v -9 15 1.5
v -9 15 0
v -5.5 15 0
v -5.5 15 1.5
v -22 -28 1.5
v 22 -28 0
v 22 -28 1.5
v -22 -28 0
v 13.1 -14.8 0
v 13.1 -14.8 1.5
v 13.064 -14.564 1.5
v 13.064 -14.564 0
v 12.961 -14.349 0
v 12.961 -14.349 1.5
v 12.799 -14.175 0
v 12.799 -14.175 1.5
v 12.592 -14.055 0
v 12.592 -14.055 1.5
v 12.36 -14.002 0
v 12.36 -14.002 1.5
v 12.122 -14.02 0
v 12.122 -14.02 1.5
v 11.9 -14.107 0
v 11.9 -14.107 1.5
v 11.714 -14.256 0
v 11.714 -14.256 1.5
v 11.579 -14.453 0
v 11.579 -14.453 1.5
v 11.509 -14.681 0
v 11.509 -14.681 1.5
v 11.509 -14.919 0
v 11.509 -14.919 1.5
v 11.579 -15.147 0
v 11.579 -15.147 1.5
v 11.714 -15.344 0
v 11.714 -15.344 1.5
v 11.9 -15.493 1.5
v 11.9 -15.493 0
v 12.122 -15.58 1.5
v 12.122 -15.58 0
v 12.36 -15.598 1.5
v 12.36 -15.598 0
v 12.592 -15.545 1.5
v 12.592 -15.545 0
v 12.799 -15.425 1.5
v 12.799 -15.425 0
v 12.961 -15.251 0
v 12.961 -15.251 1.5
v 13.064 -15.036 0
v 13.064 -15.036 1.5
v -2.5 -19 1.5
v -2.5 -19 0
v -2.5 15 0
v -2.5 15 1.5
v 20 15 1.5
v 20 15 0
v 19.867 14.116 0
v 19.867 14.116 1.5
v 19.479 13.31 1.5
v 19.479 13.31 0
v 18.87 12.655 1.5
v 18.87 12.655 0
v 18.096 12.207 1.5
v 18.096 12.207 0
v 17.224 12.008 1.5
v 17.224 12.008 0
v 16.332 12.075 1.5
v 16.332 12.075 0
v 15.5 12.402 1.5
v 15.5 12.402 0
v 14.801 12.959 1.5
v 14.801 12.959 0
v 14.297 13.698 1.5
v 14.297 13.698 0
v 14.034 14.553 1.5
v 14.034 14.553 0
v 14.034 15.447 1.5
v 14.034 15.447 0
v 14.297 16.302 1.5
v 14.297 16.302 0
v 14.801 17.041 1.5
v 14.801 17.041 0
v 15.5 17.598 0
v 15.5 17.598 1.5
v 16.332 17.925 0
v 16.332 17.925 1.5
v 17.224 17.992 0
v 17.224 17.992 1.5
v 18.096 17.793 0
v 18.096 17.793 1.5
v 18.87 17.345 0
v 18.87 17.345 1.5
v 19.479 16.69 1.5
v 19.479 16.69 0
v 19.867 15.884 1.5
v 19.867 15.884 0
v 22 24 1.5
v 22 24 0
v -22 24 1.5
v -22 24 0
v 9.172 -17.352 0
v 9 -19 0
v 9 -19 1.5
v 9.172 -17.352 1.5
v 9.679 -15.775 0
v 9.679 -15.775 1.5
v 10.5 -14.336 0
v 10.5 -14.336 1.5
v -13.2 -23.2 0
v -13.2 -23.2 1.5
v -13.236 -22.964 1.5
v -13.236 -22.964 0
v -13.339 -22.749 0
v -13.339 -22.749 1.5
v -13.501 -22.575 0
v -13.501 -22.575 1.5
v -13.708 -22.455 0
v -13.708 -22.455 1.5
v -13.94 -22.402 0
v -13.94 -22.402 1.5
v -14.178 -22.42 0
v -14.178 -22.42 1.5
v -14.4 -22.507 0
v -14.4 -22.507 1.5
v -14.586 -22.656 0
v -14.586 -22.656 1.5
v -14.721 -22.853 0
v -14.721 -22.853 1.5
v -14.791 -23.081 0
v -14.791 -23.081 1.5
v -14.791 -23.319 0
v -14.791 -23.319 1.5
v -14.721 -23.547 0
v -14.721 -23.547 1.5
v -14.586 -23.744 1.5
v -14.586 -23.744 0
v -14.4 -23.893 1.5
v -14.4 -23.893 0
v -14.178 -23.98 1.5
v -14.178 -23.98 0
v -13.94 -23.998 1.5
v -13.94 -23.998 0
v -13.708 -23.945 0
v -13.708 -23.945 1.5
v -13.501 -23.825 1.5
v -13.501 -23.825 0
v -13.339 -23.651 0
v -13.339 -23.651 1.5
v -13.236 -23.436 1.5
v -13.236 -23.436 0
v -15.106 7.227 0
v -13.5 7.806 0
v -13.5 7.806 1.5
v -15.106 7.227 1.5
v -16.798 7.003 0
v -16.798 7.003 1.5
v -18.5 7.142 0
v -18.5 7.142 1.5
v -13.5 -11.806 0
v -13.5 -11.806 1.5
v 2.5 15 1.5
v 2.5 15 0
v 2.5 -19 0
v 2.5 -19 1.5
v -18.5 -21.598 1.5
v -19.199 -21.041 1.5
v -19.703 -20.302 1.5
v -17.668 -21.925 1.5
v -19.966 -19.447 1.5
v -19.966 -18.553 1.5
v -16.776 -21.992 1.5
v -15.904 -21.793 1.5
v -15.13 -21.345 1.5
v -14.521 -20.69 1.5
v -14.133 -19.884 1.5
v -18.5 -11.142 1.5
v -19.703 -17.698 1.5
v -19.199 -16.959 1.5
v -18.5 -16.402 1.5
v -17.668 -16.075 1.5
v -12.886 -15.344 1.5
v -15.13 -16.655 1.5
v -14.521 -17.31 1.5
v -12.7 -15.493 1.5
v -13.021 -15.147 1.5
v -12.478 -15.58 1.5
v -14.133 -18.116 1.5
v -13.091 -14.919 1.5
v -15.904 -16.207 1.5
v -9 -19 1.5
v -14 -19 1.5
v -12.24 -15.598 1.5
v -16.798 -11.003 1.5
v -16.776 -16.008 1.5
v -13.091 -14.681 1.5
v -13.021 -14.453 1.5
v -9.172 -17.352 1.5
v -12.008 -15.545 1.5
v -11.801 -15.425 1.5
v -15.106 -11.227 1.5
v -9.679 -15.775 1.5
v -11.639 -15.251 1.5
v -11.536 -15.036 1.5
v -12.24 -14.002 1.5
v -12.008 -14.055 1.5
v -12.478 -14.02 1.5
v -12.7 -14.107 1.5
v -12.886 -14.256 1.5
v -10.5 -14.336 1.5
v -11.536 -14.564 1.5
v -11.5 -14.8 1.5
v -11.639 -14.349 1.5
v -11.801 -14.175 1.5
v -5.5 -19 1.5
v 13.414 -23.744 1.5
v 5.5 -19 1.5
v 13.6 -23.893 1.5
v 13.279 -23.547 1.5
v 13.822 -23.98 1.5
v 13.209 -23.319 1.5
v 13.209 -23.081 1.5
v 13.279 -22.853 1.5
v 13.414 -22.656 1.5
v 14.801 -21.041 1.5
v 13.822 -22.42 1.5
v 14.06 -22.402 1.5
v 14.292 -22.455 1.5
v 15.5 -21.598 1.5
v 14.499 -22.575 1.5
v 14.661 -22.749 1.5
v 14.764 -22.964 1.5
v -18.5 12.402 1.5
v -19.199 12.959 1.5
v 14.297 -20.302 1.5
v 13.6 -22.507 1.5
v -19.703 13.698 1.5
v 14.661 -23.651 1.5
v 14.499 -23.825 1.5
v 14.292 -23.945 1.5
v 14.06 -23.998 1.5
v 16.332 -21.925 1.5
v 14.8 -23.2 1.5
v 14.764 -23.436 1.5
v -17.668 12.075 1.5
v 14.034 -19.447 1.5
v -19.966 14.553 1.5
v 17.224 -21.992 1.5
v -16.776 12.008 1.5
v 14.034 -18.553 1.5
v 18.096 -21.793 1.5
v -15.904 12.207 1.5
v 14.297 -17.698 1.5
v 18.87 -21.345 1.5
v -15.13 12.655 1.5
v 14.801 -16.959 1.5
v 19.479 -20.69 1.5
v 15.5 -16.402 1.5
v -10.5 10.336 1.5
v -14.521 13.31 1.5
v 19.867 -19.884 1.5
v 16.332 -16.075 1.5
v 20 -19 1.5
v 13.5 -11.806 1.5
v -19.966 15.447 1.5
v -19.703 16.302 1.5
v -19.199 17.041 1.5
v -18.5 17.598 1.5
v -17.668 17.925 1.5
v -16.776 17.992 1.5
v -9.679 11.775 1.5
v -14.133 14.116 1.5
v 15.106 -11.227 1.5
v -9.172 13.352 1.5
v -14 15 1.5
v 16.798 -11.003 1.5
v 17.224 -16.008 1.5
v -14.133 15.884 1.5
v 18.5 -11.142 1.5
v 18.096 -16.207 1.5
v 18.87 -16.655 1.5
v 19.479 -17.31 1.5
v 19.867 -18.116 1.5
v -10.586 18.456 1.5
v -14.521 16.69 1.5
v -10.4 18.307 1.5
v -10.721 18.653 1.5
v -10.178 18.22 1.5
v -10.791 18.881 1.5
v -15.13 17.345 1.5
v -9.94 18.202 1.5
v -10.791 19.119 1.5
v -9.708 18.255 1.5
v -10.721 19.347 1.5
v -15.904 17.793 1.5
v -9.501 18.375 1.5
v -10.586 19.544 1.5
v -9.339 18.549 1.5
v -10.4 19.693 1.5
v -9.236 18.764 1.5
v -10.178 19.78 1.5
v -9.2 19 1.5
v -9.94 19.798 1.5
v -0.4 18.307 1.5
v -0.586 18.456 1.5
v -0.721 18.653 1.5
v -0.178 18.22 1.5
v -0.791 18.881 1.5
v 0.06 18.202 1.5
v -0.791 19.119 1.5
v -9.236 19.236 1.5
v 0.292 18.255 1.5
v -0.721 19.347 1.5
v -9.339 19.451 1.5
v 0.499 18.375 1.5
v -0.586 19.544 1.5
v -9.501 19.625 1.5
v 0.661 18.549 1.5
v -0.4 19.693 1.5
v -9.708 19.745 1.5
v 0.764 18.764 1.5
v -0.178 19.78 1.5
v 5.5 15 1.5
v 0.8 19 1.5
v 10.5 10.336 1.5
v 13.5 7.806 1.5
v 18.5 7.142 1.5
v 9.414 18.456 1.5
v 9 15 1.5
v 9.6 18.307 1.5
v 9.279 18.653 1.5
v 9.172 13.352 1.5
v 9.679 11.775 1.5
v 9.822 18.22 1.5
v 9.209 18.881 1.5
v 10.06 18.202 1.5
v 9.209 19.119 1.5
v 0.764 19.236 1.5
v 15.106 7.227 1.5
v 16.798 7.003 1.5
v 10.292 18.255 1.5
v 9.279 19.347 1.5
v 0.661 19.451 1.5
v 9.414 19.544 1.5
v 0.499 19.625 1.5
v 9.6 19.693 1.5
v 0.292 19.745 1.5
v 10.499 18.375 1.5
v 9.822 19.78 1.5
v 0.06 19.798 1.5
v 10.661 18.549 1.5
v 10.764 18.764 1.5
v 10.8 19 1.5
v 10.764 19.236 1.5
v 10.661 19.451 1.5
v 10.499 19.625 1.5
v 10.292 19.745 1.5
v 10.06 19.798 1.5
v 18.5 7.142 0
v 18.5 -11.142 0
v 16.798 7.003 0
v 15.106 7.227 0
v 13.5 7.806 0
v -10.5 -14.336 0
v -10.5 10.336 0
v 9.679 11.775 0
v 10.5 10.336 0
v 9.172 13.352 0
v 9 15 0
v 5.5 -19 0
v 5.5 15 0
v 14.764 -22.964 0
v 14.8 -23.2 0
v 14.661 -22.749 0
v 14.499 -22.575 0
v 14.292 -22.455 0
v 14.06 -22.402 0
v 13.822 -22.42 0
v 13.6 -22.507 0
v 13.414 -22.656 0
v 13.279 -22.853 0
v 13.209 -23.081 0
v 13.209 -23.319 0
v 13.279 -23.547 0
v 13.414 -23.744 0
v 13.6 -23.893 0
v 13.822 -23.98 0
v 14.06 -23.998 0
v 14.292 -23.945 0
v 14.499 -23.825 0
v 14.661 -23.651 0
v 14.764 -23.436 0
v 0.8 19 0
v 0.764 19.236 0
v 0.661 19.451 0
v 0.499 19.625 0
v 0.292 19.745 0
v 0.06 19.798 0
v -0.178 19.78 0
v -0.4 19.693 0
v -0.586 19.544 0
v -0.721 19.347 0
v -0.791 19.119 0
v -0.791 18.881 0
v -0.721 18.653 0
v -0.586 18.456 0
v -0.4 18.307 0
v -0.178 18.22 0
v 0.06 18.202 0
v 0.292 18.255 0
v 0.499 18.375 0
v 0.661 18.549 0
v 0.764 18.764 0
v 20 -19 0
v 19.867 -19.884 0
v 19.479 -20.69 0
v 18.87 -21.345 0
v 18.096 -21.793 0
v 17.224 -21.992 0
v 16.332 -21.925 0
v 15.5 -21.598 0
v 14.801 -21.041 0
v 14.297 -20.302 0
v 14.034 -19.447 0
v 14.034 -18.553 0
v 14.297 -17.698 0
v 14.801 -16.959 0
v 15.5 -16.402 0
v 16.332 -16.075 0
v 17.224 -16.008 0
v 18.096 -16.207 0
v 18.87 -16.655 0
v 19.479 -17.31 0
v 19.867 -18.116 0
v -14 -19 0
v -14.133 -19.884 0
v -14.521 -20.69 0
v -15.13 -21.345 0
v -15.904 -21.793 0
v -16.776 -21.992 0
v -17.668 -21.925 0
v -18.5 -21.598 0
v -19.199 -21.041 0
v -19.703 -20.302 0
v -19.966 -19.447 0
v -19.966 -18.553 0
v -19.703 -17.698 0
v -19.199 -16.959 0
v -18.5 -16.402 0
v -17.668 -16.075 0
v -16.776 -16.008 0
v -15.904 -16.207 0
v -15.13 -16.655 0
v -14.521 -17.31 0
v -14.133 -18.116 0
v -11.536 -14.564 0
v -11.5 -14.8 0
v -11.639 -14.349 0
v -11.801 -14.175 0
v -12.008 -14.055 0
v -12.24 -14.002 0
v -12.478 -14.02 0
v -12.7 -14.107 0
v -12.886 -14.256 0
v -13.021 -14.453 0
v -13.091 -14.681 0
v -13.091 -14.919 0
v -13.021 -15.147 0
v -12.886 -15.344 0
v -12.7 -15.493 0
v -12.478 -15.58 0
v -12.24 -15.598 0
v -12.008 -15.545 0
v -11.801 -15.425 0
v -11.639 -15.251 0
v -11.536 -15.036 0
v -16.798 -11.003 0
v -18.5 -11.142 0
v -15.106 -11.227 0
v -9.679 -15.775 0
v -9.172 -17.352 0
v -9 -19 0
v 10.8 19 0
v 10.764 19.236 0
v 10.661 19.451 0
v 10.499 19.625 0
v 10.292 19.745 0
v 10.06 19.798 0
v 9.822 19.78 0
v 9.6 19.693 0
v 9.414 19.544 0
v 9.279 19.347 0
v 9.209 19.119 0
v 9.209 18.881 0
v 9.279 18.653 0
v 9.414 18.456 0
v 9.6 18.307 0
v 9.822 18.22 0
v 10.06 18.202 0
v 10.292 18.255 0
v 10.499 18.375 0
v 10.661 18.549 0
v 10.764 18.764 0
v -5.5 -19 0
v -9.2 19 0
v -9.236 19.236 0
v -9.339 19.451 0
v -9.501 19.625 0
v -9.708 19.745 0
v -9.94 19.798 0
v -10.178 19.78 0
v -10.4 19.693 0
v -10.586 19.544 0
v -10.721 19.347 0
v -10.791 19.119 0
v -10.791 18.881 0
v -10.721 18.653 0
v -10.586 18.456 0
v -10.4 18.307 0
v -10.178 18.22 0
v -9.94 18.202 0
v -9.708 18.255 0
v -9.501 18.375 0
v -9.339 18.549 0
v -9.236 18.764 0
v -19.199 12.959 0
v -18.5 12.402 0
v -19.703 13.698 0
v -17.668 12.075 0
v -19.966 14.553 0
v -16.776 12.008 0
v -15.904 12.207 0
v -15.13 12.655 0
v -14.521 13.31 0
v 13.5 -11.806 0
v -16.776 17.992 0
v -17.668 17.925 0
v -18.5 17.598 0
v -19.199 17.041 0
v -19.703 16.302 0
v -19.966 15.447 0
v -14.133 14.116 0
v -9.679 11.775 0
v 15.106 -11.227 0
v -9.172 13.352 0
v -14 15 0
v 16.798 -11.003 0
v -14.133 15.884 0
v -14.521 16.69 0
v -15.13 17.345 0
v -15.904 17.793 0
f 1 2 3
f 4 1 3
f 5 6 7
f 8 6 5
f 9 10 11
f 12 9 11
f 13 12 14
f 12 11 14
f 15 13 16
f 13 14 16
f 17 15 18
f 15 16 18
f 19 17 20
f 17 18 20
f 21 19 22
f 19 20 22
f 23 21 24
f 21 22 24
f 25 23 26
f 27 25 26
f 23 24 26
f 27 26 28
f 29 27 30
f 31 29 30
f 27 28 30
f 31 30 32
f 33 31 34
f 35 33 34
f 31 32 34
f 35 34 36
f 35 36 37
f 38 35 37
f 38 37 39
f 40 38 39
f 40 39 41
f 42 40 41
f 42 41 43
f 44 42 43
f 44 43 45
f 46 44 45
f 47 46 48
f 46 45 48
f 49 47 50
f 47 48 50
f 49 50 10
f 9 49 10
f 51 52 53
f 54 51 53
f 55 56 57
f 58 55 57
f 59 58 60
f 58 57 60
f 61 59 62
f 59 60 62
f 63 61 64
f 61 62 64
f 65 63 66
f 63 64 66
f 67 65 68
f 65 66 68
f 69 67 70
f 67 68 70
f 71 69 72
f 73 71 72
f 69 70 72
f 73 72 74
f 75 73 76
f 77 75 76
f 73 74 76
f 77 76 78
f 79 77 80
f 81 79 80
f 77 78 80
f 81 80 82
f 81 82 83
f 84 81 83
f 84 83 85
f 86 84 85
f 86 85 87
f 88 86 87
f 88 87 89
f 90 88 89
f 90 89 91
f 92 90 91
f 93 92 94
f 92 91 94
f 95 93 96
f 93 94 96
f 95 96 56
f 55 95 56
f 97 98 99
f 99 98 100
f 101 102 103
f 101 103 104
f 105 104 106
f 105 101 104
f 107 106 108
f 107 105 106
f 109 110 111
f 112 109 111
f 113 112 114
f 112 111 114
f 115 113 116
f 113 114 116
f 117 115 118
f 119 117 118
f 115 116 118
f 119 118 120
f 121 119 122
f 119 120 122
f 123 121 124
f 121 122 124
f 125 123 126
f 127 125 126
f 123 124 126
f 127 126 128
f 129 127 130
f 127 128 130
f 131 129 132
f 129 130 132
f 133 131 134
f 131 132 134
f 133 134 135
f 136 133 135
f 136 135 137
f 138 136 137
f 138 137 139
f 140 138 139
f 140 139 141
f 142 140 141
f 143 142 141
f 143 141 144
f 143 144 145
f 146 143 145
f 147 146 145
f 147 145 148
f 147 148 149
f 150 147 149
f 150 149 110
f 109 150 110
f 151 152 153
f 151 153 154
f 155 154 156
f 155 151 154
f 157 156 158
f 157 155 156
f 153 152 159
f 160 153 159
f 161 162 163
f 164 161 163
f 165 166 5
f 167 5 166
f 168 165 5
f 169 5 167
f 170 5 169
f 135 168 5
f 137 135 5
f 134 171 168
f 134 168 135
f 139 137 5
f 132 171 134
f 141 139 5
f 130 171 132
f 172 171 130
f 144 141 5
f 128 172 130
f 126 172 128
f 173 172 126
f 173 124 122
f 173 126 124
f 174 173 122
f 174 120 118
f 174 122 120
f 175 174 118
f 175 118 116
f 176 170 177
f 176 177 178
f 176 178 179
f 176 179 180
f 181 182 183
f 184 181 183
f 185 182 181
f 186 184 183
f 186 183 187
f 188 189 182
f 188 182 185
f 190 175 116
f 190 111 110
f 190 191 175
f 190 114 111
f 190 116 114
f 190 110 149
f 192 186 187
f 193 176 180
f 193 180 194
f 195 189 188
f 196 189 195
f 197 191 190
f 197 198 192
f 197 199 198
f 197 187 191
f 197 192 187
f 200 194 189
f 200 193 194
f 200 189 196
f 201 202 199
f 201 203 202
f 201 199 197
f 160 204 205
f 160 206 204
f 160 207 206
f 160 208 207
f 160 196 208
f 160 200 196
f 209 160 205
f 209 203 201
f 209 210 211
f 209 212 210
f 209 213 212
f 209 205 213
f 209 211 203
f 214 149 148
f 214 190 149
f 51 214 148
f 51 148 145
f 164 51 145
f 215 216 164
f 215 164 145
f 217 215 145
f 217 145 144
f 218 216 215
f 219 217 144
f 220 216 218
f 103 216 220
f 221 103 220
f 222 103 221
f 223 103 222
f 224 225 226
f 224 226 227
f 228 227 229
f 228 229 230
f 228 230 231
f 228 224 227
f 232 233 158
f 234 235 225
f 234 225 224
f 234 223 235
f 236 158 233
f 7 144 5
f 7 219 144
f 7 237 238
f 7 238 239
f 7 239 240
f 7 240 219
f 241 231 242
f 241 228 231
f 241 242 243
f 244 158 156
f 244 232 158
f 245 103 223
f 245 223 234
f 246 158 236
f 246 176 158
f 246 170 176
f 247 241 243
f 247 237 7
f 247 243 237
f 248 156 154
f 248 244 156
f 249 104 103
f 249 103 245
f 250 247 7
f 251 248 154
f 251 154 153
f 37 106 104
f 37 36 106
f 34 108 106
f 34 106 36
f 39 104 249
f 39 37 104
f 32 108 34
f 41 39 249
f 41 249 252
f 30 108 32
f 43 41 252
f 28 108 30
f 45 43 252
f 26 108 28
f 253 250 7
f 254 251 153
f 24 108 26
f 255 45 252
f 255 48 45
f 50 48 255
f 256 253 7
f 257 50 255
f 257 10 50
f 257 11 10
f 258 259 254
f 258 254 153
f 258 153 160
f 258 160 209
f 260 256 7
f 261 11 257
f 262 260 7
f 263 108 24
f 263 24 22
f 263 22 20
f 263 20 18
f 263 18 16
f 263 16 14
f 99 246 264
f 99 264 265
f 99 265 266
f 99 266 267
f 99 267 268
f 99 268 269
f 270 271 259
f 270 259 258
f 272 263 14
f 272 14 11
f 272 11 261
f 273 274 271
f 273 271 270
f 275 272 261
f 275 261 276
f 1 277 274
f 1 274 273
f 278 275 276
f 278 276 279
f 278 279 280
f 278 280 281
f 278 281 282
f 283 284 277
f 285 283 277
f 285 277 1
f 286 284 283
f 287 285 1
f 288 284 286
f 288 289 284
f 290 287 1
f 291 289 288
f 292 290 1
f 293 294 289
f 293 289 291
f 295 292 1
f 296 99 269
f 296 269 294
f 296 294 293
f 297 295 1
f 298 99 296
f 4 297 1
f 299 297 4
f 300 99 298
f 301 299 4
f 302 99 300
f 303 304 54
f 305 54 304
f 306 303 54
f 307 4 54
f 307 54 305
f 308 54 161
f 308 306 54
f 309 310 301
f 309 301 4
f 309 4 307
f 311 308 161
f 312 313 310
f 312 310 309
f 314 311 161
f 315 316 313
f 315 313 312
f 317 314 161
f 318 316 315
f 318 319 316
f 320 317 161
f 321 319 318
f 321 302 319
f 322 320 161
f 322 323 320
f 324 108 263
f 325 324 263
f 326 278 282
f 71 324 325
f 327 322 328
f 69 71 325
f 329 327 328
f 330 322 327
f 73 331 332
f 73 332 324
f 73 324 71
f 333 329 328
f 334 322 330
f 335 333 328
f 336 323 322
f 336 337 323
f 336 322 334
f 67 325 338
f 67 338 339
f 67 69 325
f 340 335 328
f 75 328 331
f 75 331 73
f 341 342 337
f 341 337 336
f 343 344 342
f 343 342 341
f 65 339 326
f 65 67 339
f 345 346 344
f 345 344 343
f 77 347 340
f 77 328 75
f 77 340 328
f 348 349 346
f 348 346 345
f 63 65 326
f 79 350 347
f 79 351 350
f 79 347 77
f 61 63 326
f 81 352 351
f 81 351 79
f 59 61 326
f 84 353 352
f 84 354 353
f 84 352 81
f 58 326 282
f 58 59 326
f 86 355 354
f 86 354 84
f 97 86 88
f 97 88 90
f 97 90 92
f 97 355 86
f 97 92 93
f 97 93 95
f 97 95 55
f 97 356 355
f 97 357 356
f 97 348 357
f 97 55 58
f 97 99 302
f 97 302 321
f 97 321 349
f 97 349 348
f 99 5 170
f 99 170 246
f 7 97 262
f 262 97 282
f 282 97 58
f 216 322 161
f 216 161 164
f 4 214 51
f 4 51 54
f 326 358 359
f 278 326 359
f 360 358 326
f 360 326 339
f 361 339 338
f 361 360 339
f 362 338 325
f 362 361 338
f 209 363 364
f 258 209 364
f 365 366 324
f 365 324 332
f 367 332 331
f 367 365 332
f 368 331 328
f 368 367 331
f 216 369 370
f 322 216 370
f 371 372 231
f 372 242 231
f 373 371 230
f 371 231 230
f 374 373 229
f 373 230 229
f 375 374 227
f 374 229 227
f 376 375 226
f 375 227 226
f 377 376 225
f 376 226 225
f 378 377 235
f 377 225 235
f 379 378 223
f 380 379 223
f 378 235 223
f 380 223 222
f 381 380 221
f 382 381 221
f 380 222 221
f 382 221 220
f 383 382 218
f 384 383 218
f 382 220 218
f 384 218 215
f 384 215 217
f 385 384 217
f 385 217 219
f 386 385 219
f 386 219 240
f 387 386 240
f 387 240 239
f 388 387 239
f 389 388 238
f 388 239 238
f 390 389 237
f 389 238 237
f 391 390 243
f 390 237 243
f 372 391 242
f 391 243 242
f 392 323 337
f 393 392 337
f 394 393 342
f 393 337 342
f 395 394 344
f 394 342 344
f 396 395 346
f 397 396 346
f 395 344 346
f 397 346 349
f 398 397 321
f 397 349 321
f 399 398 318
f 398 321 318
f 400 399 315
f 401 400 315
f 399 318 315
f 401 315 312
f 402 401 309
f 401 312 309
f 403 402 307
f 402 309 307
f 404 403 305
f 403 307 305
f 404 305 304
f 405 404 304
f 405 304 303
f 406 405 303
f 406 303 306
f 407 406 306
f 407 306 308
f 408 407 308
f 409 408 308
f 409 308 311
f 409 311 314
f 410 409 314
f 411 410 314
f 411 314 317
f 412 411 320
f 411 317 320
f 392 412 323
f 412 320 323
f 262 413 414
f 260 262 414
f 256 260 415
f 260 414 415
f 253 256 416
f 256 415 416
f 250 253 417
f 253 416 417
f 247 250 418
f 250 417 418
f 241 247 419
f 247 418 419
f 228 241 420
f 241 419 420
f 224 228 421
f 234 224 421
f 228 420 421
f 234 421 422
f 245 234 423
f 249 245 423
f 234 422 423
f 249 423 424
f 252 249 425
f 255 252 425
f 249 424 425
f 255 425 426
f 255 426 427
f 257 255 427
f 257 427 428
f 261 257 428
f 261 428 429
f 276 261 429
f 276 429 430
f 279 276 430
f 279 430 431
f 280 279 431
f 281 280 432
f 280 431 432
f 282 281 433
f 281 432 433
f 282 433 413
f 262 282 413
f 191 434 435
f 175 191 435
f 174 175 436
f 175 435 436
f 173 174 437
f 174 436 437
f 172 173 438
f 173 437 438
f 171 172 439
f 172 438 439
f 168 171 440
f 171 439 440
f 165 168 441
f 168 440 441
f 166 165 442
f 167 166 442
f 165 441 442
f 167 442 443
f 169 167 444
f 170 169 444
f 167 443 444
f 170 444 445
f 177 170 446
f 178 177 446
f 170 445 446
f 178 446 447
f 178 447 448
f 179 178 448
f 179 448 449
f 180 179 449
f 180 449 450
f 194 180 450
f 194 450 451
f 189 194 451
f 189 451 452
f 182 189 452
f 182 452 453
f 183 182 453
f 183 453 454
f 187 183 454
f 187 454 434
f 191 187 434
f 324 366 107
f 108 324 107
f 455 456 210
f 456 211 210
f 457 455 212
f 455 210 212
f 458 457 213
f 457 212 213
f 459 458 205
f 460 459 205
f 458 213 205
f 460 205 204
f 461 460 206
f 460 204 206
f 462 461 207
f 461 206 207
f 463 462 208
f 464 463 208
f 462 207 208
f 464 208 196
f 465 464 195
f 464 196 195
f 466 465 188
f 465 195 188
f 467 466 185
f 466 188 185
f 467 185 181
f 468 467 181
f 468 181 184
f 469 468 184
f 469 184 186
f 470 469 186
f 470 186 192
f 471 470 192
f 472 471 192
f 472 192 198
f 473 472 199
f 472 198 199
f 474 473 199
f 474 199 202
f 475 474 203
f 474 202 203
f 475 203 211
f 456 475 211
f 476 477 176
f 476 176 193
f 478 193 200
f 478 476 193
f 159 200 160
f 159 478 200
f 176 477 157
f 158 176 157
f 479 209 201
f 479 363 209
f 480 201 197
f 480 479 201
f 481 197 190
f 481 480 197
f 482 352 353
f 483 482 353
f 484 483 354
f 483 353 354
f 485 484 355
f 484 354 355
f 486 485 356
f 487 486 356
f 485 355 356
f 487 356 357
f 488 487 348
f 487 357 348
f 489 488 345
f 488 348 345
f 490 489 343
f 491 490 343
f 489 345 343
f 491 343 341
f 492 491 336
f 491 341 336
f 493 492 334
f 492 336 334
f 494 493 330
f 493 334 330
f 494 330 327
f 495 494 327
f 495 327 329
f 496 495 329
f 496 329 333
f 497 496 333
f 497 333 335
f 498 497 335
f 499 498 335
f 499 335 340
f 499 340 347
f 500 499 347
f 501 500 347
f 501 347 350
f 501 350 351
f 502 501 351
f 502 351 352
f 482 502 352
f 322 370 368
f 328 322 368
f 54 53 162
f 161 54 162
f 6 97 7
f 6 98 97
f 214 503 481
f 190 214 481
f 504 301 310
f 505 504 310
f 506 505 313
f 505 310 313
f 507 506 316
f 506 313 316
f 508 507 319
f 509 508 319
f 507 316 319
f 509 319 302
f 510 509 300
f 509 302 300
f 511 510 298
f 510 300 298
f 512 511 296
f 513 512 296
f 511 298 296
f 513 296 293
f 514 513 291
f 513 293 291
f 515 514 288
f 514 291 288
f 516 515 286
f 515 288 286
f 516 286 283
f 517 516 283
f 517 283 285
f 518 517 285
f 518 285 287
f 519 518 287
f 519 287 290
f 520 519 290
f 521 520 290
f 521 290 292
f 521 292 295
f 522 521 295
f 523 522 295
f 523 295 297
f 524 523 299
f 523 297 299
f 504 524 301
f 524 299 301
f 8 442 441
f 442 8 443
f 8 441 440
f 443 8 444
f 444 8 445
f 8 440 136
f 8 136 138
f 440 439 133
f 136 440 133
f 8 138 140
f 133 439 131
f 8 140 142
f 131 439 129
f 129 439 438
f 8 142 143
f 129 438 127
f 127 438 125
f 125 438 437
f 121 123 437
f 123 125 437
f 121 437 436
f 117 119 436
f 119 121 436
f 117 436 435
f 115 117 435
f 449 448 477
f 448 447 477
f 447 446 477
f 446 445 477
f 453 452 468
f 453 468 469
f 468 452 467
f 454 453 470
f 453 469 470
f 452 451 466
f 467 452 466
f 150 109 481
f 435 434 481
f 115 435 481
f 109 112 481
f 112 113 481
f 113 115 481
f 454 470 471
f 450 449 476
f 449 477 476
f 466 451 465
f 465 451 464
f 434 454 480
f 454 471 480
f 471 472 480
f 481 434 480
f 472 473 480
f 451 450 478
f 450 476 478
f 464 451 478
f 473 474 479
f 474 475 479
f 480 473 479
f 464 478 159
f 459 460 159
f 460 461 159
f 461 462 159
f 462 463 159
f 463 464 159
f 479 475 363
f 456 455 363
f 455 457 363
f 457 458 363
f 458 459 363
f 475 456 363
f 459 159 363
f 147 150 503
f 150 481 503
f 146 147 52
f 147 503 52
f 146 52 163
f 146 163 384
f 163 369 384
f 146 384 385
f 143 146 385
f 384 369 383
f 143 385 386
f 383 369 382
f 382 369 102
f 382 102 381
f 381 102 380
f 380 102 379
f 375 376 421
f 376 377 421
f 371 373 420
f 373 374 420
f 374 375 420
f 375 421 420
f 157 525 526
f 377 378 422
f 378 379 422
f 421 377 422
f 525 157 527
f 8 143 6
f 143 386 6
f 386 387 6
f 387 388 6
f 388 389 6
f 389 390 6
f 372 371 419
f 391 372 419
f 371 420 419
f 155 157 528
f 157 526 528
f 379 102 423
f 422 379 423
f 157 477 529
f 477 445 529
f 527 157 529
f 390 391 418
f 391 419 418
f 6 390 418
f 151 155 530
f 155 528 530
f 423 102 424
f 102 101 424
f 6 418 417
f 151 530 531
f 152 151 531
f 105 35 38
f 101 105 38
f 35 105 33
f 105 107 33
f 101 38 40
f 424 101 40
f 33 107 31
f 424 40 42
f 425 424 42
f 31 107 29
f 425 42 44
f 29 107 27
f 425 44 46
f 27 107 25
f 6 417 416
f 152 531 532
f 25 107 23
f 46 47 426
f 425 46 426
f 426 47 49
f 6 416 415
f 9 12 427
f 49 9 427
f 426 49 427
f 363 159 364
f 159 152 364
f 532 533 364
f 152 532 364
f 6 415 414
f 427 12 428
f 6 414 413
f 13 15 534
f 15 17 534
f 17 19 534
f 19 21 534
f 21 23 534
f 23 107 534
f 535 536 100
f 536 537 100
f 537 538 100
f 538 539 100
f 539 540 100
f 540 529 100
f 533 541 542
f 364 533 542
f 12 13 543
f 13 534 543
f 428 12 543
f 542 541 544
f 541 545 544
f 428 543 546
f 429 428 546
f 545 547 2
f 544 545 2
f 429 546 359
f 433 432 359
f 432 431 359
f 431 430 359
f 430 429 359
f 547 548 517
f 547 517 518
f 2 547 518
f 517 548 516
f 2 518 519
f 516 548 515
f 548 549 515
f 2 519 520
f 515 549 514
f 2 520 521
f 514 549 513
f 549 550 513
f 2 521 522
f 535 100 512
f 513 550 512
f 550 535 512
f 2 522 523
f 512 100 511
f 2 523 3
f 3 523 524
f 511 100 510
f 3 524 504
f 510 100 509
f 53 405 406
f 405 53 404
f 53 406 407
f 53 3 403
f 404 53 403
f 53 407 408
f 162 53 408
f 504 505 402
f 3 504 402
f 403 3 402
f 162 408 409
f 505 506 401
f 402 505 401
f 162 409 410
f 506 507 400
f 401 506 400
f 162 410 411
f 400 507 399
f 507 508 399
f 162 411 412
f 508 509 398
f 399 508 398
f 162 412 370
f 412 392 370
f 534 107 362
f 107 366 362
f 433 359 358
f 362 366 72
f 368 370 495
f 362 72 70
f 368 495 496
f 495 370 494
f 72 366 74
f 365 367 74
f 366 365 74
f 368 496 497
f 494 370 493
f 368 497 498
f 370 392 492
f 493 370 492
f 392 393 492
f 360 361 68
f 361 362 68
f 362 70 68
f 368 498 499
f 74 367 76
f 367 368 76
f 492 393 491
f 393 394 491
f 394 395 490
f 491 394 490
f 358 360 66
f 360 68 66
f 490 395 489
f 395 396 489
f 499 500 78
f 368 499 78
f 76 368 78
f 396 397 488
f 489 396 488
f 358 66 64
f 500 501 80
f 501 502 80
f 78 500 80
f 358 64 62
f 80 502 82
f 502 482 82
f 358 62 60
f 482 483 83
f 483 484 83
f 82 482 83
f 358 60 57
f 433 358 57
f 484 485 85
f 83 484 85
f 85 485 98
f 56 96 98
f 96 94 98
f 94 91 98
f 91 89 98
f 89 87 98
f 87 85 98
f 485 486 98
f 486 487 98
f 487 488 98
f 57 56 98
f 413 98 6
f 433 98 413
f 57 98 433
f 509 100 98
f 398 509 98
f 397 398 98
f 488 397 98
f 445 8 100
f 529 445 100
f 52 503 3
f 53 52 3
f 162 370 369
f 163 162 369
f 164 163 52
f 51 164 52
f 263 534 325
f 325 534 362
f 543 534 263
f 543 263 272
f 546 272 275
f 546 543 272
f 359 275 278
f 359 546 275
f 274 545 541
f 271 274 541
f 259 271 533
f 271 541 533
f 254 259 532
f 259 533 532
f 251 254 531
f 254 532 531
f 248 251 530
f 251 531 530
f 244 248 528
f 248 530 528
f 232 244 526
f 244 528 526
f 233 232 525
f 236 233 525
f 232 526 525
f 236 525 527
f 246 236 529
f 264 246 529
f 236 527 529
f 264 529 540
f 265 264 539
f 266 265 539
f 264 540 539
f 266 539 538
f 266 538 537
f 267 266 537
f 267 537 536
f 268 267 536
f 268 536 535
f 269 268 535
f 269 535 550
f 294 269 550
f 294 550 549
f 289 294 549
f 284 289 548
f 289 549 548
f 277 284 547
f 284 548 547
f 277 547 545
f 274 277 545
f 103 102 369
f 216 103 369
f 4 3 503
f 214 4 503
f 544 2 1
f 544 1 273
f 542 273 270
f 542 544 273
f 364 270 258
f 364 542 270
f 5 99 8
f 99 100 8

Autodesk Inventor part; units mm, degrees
ref_plane "YZ Plane" through (0, 0, 0) normal (1, 0, 0) x (0, 1, 0)
ref_plane "XZ Plane" through (0, 0, 0) normal (0, 1, 0) x (-1, 0, 0)
ref_plane "XY Plane" through (0, 0, 0) normal (0, 0, 1) x (1, 0, 0)
sketch "スケッチ1" plane through (0, 0, 0) normal (0, 0, 1) x (1, 0, 0)
  line L0 (-22, -24) -> (22, -24)
  line L1 (22, -24) -> (22, 24)
  line L2 (22, 24) -> (-22, 24)
  line L3 (-22, 24) -> (-22, -24)
  line L4 (-22, -24) -> (22, 24) construction
  line L5 (22, -24) -> (-22, 24) construction
  line L6 (-17, 15) -> (17, 15)
  line L7 (17, 15) -> (17, -19)
  line L8 (17, -19) -> (-17, -19)
  line L9 (-17, -19) -> (-17, 15)
  circle A0 centre (-17, 15) radius 3
  circle A1 centre (17, 15) radius 3
  circle A2 centre (17, -19) radius 3
  circle A3 centre (-17, -19) radius 3
  circle A4 centre (-17, 15) radius 8
  circle A5 centre (17, 15) radius 8
  circle A6 centre (17, -19) radius 8
  circle A7 centre (-17, -19) radius 8
  line L10 (-22, -24) -> (22, -24)
  line L11 (22, -24) -> (22, -28)
  line L12 (22, -28) -> (-22, -28)
  line L13 (-22, -28) -> (-22, -24)
  line L14 (-2.5, 15) -> (2.5, 15)
  line L15 (2.5, 15) -> (2.5, -19)
  line L16 (2.5, -19) -> (-2.5, -19)
  line L17 (-2.5, -19) -> (-2.5, 15)
  line L18 (10.5, 15) -> (10.5, -19)
  line L19 (5.5, -19) -> (5.5, 15)
  line L20 (18.5, 15) -> (18.5, -19)
  line L21 (13.5, -19) -> (13.5, 15)
  line L22 (-5.5, 15) -> (-5.5, -19)
  line L23 (-10.5, -19) -> (-10.5, 15)
  line L24 (2.5, 15) -> (2.5, -19)
  line L25 (-2.5, -19) -> (-2.5, 15)
  line L26 (10.5, 15) -> (10.5, -19)
  line L27 (5.5, -19) -> (5.5, 15)
  line L28 (-13.5, 15) -> (-13.5, -19)
  line L29 (-18.5, -19) -> (-18.5, 15)
  line L30 (-5.5, 15) -> (-5.5, -19)
  line L31 (-10.5, -19) -> (-10.5, 15)
  line L32 (2.5, 15) -> (2.5, -19)
  line L33 (-2.5, -19) -> (-2.5, 15)
  point P0 (0, 0)
  point P1 (-9, 15)
  point P2 (9, 15)
  point P3 (17, 7)
  point P4 (17, -11)
  point P5 (9, -19)
  point P6 (-9, -19)
  point P7 (-17, -11)
  point P8 (-17, 7)
  point P9 (22, -24)
  point P10 (0, 15)
  point P11 (-18.5, 7.1419)
  point P12 (-18.5, -11.1419)
  point P13 (-13.5, -11.8063)
  point P14 (-13.5, 7.8063)
  point P15 (-10.5, 15)
  point P16 (-10.5, -19)
  point P17 (-5.5, -19)
  point P18 (-5.5, 15)
  point P19 (13.5, 7.8063)
  point P20 (13.5, -11.8063)
  point P21 (18.5, -11.1419)
  point P22 (18.5, 7.1419)
  point P23 (5.5, 15)
  point P24 (5.5, -19)
  point P25 (10.5, -19)
  point P26 (10.5, 15)
  point P27 (-2.5, -19)
  point P28 (2.5, 15)
  point P29 (-10.5, -14.3363)
  point P30 (-10.5, 10.3363)
  point P31 (10.5, 10.3363)
  point P32 (10.5, -14.3363)
  dimension "d0" = 48
  dimension "d1" = 44
  dimension "d2" = 34
  dimension "d3" = 5
  dimension "d4" = 5
  dimension "d5" = 6
  dimension "d6" = 16
  dimension "d11" = 4
  dimension "d12" = 5
  dimension "d15" = 8
  dimension "d18" = 8
extrude "プレート1" add sketch "スケッチ1" along normal blind 1.5 contours L3 A7 L29 A3 L8 L0 | L0 A7 L13 | A7 L8 A6 L0 | L0 A6 L11 L12 L13 A7 | L3 A4 L29 A7 | A6 L8 A2 L20 L1 L0 | L0 L11 A6 | L8 L23 A7 | L3 A4 L6 A0 L29 | A7 L9 A3 L29 | A6 L18 L8 | L22 L6 L17 L8 | L8 L28 A7 L23 | A7 L28 A4 L23 | L3 L2 L1 A5 L6 A4 | L29 A0 L9 A4 | A7 L28 L8 A3 L9 | A6 L20 A5 L1 | L18 A6 L21 L8 | L8 L15 L6 L19 | L18 A5 L21 A6 | L23 L6 A4 | A4 L28 L6 L23 | L9 A0 L6 L28 A4 | A5 L20 A1 L6 L1 | L20 A2 L7 A6 | L21 A6 L7 A2 L8 | L18 L6 L21 A5 | A5 L6 L18 | A5 L7 A1 L20 | L21 L6 A1 L7 A5
sketch "スケッチ2" plane through (0, 0, 1.5) normal (0, 0, 1) x (1, 0, 0)
  line L0 (11.5, -21.5) -> (11.5, -14.8) projected
  line L1 (11.5, -21.5) -> (12, -21.5) projected
  line L2 (12, -21.5) -> (12, -24) projected
  line L3 (18, -24) -> (14, -24) projected
  line L4 (18, -14) -> (18, -24) construction
  line L5 (12.3, -14) -> (18, -14) projected
  circle A0 centre (12.3, -14.8) radius 0.8
  circle A1 centre (14, -23.2) radius 0.8
  line L6 (0, 0) -> (0, -10)
  circle A2 centre (-12.3, -14.8) radius 0.8
  circle A3 centre (-14, -23.2) radius 0.8
  arc A4 (11.5, -14.8) -> (12.3, -14) centre (12.3, -14.8) ccw projected
  line L7 (14, -24) -> (12, -24) projected
  circle A5 centre (14, -23.2) radius 0.8 projected
  dimension "d21" = 1.6
  dimension "d22" = 1.6
  dimension "d25" = 2
extrude "切り取り1" cut sketch "スケッチ2" against normal blind 1.5
sketch "スケッチ3" plane through (0, 0, 1.5) normal (0, 0, 1) x (1, 0, 0)
  circle A0 centre (0, 19) radius 0.8
  circle A1 centre (-10, 19) radius 0.8
  circle A2 centre (10, 19) radius 0.8
  line L0 (-22, 24) -> (22, 24) projected
  point P0 (0, 0)
  point P1 (0, 24)
  dimension "d26" = 1.6
  dimension "d27" = 1.6
  dimension "d28" = 1.6
  dimension "d29" = 5
  dimension "d30" = 10
  dimension "d31" = 10
extrude "切り取り2" cut sketch "スケッチ3" against normal blind 1.5
equation "\"d4\" = d3"
equation "\"d23\" = Thickness"
equation "\"d32\" = Thickness"
equation "\"d10\" = Thickness"
equation "\"BendRadius\" = Thickness"
equation "\"BendReliefWidth\" = Thickness"
equation "\"BendReliefDepth\" = 0.5 * Thickness"
equation "\"CornerReliefSize\" = 4 * Thickness"
equation "\"MinimumRemnant\" = 2 * Thickness"
equation "\"TransitionRadius\" = BendRadius"
equation "\"JacobiRadiusSize\" = BendRadius"
equation "\"GapSize\" = Thickness"
equation "\"Thickness\" = 1.5"
properties part number "board_setter_base" material "アルミニウム 6061"
